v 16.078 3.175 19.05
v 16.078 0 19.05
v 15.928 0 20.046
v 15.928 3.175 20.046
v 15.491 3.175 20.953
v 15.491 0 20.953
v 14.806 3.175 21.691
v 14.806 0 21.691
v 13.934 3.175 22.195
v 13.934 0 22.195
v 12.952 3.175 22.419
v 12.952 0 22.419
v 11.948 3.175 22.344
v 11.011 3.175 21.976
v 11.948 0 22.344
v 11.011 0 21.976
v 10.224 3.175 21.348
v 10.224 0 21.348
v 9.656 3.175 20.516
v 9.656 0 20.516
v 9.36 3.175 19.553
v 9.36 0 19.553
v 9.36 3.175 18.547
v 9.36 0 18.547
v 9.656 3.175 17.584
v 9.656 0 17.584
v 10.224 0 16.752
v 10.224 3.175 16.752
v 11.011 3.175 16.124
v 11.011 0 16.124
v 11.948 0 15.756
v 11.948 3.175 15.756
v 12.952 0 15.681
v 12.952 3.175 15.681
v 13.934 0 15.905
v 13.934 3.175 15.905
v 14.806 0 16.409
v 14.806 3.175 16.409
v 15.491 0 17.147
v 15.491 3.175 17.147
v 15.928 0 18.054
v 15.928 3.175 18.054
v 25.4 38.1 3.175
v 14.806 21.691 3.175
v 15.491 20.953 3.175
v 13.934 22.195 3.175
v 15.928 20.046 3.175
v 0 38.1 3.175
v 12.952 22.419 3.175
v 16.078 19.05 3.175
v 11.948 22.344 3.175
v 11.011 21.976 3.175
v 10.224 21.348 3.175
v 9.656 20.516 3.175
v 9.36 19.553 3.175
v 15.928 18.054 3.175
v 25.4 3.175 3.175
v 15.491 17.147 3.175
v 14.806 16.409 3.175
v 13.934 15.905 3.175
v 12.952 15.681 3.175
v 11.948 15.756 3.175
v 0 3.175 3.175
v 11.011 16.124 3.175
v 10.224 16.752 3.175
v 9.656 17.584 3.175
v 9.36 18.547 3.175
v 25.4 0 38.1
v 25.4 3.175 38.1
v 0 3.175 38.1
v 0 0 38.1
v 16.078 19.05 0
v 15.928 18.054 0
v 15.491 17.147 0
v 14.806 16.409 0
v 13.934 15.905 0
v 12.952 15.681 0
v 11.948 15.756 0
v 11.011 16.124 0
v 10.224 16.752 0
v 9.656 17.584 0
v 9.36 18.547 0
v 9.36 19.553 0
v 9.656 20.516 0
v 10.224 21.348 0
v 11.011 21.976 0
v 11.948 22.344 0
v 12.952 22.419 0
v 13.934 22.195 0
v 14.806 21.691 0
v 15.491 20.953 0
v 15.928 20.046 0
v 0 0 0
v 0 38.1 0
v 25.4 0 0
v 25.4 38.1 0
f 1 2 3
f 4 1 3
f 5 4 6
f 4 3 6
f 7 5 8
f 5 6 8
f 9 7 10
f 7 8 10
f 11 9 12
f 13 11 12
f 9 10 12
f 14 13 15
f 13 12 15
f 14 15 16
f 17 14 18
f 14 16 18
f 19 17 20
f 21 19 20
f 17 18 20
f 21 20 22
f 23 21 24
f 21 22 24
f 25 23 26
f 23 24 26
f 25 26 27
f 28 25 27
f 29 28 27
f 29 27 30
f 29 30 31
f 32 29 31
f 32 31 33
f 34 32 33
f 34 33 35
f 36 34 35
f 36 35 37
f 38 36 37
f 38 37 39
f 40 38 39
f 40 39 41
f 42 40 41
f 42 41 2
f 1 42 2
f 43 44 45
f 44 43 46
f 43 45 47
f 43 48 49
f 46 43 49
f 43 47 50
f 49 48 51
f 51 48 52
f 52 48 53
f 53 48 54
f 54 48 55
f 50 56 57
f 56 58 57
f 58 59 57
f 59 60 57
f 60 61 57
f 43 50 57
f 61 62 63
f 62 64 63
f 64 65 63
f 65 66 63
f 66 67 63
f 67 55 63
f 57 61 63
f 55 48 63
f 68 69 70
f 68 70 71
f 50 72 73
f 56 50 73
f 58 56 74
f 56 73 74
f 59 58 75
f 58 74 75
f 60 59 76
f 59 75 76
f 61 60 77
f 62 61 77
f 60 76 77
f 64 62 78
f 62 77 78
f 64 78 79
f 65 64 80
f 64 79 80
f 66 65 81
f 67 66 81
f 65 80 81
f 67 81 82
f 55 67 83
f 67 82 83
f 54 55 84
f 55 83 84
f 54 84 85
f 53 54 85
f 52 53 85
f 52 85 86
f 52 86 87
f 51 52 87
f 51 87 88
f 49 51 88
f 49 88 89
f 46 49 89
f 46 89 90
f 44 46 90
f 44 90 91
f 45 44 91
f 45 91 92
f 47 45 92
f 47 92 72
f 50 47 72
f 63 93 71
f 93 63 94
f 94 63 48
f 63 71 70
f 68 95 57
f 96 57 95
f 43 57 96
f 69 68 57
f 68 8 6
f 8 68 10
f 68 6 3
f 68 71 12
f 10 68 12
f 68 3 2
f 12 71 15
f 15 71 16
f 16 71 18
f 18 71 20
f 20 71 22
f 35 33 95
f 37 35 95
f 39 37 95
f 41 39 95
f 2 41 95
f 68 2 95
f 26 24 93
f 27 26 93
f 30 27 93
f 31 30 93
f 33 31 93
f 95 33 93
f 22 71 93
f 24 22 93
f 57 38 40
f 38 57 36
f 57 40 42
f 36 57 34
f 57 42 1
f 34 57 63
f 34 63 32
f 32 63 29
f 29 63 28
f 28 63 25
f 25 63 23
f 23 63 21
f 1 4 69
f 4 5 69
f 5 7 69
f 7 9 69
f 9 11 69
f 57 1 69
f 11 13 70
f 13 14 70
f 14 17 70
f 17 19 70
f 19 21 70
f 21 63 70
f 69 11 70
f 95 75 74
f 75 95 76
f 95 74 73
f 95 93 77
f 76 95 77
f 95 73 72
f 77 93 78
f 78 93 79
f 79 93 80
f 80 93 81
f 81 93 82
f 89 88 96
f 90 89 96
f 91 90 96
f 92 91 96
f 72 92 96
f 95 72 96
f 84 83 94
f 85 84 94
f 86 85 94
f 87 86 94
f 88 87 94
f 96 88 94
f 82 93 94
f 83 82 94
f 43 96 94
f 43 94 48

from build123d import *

# Parameters (mm, degrees)
F1_DEPTH = 25.4
F2_R     = 3.3782
F3_DEPTH = 25.4
F4_R     = 3.3782
F5_DEPTH = 25.4


with BuildPart() as f1:
    # F0 (on Right) → F1 (new body)
    with BuildSketch(Plane.YZ):
        Polygon((0, 38.1), (0, 0), (38.1, 0), (38.1, 3.175), (3.175, 3.175), (3.175, 38.1), align=None)
    extrude(amount=F1_DEPTH)

    # F2 (on face) → F3 (cut)
    with BuildSketch(Plane.XZ):
        with Locations((12.7, 19.05)):
            Circle(F2_R)
    extrude(amount=-F3_DEPTH, mode=Mode.SUBTRACT)

    # F4 (on face) → F5 (cut)
    with BuildSketch(Plane(origin=(0, 0, 0), x_dir=(1, 0, 0), z_dir=(0, 0, -1))):
        with Locations((12.7, -19.05)):
            Circle(F4_R)
    extrude(amount=-F5_DEPTH, mode=Mode.SUBTRACT)


solid = f1.part
